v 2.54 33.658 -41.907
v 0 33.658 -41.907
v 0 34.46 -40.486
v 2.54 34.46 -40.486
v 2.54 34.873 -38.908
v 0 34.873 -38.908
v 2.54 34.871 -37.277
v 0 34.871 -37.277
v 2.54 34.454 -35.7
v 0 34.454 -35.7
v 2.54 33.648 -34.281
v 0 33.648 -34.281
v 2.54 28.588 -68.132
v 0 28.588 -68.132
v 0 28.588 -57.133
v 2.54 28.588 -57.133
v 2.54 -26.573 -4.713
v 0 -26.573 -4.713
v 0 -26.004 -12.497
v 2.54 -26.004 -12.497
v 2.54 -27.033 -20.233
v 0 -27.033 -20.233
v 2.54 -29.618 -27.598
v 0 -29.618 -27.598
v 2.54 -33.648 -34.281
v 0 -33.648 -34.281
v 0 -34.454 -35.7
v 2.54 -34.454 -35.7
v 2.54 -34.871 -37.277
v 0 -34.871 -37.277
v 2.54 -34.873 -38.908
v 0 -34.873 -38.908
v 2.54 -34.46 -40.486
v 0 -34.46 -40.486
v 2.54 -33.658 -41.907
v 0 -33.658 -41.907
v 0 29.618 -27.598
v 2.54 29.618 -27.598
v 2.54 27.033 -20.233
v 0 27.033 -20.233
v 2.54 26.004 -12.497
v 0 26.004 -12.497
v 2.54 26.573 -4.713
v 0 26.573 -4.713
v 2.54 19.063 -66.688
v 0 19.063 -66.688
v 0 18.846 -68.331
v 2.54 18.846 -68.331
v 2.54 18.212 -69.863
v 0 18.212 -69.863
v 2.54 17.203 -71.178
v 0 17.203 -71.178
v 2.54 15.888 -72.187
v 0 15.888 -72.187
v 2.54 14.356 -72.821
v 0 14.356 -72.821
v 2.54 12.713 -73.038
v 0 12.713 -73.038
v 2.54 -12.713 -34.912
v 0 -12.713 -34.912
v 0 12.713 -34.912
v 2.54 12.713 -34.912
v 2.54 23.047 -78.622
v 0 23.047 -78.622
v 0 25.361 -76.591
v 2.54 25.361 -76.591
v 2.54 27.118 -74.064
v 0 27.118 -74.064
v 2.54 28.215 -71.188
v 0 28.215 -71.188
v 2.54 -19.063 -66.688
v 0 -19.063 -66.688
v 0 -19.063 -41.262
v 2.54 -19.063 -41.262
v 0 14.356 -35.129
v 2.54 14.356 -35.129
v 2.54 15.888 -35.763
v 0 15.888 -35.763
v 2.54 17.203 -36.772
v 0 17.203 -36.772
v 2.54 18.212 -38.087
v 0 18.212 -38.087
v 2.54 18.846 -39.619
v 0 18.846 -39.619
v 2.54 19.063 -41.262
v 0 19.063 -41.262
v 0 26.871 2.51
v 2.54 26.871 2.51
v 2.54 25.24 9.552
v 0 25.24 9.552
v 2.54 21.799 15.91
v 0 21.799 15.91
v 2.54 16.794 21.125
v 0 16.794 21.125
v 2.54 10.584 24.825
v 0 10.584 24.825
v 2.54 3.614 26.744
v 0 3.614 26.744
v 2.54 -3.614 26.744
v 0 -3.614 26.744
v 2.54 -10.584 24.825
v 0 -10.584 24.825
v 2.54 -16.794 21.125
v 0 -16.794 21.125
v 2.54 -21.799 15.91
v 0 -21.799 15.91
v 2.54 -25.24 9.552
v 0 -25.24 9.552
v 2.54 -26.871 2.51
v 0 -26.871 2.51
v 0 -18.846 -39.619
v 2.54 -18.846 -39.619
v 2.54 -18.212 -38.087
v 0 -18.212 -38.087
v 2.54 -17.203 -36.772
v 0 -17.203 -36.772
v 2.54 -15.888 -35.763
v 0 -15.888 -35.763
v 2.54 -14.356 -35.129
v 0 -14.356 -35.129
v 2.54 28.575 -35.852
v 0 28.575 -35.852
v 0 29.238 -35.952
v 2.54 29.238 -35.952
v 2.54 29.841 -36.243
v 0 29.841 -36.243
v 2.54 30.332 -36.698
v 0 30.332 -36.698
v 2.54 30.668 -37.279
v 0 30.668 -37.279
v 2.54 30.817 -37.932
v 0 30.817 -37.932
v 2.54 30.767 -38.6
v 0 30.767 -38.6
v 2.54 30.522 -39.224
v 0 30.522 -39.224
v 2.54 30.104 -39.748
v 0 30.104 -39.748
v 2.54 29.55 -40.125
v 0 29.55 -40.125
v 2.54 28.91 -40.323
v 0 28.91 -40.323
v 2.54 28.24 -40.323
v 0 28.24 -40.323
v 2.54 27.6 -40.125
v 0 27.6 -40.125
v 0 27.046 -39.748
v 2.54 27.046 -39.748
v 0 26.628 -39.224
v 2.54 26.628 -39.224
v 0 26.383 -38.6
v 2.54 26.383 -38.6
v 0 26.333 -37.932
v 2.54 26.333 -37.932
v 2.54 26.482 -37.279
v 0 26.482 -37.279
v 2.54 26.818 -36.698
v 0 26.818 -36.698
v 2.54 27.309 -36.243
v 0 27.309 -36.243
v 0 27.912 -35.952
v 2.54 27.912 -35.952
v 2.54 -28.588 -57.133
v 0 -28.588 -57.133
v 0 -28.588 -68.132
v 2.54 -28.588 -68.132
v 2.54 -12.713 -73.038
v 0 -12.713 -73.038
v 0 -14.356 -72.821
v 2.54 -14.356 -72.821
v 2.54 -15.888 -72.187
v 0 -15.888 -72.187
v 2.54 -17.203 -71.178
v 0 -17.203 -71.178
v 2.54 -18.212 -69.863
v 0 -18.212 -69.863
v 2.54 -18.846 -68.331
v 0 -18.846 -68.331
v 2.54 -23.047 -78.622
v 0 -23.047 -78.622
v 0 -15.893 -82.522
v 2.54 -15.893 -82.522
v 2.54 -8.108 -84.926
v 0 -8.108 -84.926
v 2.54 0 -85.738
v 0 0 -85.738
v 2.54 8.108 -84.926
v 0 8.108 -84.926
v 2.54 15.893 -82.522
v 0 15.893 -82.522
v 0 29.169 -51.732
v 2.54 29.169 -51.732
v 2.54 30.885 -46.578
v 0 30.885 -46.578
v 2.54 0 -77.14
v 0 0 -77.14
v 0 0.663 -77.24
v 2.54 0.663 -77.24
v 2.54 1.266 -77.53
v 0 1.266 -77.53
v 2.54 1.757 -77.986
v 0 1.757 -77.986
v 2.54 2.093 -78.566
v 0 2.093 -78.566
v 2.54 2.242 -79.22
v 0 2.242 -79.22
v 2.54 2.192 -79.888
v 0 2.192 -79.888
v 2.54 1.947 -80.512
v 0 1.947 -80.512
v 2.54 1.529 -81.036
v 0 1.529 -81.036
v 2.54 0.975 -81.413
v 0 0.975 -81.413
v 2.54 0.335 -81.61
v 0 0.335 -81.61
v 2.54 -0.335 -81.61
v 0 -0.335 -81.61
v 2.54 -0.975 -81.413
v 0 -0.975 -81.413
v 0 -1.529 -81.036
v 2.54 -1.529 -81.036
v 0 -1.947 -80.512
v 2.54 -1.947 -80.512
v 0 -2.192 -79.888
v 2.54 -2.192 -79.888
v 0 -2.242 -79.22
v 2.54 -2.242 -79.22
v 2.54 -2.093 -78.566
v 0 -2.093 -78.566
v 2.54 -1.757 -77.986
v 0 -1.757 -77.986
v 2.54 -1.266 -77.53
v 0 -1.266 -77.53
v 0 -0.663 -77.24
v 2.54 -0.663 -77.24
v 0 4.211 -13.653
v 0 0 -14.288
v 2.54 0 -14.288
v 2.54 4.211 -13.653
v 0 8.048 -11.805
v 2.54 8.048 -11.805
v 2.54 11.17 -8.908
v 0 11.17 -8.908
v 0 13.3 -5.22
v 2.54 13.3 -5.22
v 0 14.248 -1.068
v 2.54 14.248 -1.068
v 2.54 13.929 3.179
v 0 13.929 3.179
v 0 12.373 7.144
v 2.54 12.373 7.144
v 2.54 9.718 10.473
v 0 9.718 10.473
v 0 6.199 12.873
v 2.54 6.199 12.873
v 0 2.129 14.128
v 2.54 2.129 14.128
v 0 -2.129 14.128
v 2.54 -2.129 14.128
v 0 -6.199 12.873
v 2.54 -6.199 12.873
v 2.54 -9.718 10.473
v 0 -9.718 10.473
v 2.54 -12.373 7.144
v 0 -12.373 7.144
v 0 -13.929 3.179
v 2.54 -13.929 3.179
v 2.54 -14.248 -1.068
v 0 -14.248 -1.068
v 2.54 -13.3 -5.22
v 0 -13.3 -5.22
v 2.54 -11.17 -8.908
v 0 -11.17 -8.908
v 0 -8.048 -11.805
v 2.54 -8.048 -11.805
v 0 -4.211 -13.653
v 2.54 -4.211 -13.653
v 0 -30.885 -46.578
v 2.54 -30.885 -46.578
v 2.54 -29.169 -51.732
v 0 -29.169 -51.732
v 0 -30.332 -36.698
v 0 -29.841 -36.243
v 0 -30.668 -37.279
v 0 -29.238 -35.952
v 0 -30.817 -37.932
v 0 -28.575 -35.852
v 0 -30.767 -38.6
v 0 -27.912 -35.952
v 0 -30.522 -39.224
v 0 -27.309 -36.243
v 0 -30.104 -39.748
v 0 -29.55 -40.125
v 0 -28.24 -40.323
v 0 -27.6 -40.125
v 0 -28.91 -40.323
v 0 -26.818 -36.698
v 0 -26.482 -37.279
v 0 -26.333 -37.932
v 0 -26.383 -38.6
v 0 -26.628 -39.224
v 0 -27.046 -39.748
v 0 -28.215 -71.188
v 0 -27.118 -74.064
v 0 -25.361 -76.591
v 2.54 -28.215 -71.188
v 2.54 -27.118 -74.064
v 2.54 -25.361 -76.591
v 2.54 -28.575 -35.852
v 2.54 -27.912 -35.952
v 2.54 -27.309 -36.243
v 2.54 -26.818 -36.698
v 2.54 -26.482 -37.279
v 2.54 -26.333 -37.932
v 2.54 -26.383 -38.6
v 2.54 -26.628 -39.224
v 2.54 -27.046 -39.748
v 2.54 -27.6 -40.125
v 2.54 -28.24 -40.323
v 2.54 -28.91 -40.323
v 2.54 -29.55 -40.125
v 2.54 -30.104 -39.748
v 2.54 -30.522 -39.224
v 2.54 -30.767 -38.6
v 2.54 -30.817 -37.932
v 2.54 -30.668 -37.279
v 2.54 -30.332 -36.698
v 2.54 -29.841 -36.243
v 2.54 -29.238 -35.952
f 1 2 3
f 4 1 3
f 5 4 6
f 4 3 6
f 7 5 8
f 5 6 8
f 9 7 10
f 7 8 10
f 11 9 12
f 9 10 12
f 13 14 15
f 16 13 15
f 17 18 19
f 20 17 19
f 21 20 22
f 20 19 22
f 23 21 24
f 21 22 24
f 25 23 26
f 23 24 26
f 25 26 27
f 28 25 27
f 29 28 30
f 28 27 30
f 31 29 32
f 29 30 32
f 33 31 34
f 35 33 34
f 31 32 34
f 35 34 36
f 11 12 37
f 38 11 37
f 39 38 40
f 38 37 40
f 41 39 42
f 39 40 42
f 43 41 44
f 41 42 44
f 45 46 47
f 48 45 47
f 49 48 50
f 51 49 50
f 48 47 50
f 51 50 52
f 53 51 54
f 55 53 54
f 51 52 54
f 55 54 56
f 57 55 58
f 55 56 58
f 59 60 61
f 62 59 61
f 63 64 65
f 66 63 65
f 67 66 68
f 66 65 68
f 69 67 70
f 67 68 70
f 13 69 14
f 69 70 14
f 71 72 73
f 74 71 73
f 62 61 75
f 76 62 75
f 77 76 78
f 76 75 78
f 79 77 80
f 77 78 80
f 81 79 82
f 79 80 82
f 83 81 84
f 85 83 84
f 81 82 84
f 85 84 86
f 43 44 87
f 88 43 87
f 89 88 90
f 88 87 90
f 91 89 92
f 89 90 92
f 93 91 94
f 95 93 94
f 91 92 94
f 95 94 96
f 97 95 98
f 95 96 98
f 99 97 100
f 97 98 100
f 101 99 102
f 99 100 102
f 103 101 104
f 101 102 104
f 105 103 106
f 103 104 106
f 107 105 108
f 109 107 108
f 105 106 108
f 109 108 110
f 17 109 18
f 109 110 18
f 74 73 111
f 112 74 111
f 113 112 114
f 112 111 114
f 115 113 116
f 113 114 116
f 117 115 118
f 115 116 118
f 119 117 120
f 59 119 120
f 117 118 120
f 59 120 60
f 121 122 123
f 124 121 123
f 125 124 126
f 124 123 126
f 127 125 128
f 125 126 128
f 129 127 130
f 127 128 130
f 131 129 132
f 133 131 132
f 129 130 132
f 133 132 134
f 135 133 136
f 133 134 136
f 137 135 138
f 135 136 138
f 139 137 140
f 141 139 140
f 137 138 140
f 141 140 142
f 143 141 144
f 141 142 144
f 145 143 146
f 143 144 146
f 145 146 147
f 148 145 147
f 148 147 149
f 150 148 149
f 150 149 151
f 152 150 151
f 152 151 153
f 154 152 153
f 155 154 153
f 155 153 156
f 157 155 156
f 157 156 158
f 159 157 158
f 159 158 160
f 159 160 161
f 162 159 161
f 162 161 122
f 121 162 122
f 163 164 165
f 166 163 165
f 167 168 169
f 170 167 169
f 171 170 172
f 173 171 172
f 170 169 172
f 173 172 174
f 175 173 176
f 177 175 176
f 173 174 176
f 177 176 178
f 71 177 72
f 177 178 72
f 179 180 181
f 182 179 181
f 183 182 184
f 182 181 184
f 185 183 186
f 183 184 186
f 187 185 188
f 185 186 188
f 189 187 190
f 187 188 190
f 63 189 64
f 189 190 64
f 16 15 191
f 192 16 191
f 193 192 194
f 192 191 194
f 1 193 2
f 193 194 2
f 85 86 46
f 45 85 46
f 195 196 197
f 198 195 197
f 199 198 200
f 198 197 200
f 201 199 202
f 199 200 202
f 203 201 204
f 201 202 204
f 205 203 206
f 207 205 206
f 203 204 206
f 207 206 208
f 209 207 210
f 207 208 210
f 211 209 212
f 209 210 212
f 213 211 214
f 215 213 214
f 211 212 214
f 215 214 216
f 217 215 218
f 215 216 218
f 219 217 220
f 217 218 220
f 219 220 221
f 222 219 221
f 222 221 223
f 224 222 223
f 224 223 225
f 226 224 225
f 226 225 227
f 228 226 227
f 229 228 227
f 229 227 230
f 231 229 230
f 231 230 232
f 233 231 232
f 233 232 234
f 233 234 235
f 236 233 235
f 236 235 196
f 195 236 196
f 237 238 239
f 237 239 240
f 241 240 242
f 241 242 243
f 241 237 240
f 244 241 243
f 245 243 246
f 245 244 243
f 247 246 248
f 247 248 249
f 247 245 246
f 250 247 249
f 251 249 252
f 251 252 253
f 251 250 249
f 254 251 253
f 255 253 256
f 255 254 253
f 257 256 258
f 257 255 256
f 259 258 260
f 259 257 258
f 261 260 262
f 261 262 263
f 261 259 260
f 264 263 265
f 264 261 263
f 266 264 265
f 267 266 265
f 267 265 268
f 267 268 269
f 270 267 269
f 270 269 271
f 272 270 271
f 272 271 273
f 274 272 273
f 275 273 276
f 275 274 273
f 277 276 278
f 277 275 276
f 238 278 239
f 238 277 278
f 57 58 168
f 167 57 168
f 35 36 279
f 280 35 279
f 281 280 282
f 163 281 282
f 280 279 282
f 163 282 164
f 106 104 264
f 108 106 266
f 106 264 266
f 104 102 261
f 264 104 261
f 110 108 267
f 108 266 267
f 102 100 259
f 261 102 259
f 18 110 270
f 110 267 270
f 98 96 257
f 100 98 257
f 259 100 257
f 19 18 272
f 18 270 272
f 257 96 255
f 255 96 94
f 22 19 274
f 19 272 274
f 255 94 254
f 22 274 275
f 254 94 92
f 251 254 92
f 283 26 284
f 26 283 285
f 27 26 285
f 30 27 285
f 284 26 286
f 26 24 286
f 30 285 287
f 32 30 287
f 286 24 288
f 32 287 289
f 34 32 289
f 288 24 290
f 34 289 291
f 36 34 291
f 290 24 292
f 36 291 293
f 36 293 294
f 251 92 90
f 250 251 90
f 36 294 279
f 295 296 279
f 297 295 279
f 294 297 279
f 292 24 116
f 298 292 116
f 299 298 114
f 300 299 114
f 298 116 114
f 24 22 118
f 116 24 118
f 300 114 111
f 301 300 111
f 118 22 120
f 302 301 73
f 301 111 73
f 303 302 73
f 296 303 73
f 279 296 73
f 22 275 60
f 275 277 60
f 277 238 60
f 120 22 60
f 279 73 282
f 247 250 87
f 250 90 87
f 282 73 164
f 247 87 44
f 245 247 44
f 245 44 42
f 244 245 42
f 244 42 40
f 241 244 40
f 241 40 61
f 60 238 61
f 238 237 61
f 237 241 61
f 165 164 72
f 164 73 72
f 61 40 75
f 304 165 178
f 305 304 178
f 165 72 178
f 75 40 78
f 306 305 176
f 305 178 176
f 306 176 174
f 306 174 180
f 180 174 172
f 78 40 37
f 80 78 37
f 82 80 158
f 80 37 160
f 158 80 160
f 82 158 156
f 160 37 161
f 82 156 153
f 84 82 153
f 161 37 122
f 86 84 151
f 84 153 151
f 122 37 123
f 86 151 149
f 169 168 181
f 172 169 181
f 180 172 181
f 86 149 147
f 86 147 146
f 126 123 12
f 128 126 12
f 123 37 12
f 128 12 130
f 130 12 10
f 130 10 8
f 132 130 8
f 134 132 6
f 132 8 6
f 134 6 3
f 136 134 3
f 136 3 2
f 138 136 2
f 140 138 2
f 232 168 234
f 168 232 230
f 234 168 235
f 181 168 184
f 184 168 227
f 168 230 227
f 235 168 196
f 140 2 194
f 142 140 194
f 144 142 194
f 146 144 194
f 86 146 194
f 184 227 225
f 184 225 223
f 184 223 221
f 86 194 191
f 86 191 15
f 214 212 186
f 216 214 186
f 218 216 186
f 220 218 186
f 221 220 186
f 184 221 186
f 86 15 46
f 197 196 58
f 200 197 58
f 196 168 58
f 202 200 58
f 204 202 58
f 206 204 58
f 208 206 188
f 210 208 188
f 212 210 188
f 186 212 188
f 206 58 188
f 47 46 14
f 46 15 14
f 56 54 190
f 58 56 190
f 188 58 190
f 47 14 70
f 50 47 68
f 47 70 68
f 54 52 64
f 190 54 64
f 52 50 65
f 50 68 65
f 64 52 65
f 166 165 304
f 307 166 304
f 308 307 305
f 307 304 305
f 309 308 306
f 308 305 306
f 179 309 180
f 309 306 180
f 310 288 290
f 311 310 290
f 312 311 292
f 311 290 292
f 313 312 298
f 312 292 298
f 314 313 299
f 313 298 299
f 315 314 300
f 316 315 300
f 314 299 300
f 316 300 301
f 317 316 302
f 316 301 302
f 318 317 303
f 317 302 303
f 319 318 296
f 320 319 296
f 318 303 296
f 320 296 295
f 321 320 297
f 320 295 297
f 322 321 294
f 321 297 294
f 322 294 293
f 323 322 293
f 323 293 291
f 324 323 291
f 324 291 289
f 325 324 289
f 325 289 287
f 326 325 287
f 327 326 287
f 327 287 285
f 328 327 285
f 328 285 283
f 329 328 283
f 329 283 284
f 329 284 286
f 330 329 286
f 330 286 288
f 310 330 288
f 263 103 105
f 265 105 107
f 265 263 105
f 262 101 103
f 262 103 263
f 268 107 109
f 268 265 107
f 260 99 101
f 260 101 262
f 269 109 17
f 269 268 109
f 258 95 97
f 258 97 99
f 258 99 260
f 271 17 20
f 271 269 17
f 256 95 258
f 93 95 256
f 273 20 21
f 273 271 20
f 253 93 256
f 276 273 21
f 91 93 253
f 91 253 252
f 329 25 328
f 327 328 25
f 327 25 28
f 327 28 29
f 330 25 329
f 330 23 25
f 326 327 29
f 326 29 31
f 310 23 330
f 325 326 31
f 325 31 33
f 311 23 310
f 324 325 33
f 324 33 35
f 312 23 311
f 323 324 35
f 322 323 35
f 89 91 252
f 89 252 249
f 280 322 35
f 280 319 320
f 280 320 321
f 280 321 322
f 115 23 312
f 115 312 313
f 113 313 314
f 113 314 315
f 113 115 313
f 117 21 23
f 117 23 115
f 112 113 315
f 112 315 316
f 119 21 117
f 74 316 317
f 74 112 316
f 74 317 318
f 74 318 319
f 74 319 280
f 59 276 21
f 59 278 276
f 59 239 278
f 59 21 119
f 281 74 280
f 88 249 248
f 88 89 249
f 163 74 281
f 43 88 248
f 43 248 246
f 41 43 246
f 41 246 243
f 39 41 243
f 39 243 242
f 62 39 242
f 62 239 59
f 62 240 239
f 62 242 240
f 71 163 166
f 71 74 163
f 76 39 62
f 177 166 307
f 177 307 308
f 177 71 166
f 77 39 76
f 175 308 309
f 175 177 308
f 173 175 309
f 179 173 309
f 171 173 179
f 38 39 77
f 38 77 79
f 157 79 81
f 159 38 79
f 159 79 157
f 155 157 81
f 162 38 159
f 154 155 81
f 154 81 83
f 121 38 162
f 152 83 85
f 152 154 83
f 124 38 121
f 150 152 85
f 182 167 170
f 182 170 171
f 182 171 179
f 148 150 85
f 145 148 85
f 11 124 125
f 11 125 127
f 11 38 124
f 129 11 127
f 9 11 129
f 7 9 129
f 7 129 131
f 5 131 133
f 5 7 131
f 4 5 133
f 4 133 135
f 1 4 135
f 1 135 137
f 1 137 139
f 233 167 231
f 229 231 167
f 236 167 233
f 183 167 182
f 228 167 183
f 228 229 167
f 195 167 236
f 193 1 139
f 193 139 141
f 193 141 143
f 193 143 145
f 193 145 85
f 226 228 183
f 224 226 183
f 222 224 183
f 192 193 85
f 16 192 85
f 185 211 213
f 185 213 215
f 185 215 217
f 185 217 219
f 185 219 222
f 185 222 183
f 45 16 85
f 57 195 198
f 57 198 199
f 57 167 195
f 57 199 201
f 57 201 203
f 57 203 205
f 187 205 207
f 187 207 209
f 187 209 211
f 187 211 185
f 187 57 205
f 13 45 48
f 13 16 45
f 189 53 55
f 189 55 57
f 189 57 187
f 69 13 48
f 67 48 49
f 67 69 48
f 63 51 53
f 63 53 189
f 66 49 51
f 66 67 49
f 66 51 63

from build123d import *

# Parameters (mm, degrees)
SKETCH1_R             = 14.2875
BOSS_EXTRUDE1_DEPTH   = 2.54
F_8_CLEARANCE_HOLE1_D = 4.4958


with BuildPart() as part:
    # Sketch1 → Boss-Extrude1 (new body)
    with BuildSketch(Plane(origin=(0, 0, 0), x_dir=(0, 0, -1), z_dir=(1, 0, 0))):
        with BuildLine():
            Line((57.133054897, -28.5877), (68.132491023, -28.5877))
            ThreePointArc((68.132491023, -28.5877), (74.063897019, -27.117500662), (78.622019681, -23.04729416))
            ThreePointArc((78.622019681, -23.04729416), (85.7377, 0), (78.622019681, 23.04729416))
            ThreePointArc((78.622019681, 23.04729416), (74.063897019, 27.117500662), (68.132491023, 28.5877))
            Line((68.132491023, 28.5877), (57.133054897, 28.5877))
            ThreePointArc((57.133054897, 28.5877), (49.108905845, 29.888466983), (41.906610979, 33.65754))
            ThreePointArc((41.906610979, 33.65754), (38.092212748, 34.924995225), (34.280934646, 33.648188329))
            ThreePointArc((34.280934646, 33.648188329), (20.233265061, 27.033421998), (4.712956656, 26.572790516))
            ThreePointArc((4.712956656, 26.572790516), (-26.9875, 0), (4.712956656, -26.572790516))
            ThreePointArc((4.712956656, -26.572790516), (20.233265061, -27.033421998), (34.280934646, -33.648188329))
            ThreePointArc((34.280934646, -33.648188329), (38.092212748, -34.924995225), (41.906610979, -33.65754))
            ThreePointArc((41.906610979, -33.65754), (49.108905845, -29.888466983), (57.133054897, -28.5877))
        make_face()
        Circle(SKETCH1_R, mode=Mode.SUBTRACT)
        with BuildLine():
            Line((41.2623, 19.0627), (66.6877, 19.0627))
            ThreePointArc((66.6877, 19.0627), (71.177828061, 17.202828061), (73.0377, 12.7127))
            Line((73.0377, 12.7127), (73.0377, -12.7127))
            ThreePointArc((73.0377, -12.7127), (71.177828061, -17.202828061), (66.6877, -19.0627))
            Line((66.6877, -19.0627), (41.2623, -19.0627))
            ThreePointArc((41.2623, -19.0627), (36.772171939, -17.202828061), (34.9123, -12.7127))
            Line((34.9123, -12.7127), (34.9123, 12.7127))
            ThreePointArc((34.9123, 12.7127), (36.772171939, 17.202828061), (41.2623, 19.0627))
        make_face(mode=Mode.SUBTRACT)
    extrude(amount=BOSS_EXTRUDE1_DEPTH)

    # #8 Clearance Hole1 (through all)
    with Locations(Plane(origin=(2.54, 0, 0), x_dir=(0, 0, -1), z_dir=(1, 0, 0))):
        with Locations((38.1, 28.575), (79.3877, 0), (38.1, -28.575)):
            Hole(F_8_CLEARANCE_HOLE1_D / 2)


solid = part.part
